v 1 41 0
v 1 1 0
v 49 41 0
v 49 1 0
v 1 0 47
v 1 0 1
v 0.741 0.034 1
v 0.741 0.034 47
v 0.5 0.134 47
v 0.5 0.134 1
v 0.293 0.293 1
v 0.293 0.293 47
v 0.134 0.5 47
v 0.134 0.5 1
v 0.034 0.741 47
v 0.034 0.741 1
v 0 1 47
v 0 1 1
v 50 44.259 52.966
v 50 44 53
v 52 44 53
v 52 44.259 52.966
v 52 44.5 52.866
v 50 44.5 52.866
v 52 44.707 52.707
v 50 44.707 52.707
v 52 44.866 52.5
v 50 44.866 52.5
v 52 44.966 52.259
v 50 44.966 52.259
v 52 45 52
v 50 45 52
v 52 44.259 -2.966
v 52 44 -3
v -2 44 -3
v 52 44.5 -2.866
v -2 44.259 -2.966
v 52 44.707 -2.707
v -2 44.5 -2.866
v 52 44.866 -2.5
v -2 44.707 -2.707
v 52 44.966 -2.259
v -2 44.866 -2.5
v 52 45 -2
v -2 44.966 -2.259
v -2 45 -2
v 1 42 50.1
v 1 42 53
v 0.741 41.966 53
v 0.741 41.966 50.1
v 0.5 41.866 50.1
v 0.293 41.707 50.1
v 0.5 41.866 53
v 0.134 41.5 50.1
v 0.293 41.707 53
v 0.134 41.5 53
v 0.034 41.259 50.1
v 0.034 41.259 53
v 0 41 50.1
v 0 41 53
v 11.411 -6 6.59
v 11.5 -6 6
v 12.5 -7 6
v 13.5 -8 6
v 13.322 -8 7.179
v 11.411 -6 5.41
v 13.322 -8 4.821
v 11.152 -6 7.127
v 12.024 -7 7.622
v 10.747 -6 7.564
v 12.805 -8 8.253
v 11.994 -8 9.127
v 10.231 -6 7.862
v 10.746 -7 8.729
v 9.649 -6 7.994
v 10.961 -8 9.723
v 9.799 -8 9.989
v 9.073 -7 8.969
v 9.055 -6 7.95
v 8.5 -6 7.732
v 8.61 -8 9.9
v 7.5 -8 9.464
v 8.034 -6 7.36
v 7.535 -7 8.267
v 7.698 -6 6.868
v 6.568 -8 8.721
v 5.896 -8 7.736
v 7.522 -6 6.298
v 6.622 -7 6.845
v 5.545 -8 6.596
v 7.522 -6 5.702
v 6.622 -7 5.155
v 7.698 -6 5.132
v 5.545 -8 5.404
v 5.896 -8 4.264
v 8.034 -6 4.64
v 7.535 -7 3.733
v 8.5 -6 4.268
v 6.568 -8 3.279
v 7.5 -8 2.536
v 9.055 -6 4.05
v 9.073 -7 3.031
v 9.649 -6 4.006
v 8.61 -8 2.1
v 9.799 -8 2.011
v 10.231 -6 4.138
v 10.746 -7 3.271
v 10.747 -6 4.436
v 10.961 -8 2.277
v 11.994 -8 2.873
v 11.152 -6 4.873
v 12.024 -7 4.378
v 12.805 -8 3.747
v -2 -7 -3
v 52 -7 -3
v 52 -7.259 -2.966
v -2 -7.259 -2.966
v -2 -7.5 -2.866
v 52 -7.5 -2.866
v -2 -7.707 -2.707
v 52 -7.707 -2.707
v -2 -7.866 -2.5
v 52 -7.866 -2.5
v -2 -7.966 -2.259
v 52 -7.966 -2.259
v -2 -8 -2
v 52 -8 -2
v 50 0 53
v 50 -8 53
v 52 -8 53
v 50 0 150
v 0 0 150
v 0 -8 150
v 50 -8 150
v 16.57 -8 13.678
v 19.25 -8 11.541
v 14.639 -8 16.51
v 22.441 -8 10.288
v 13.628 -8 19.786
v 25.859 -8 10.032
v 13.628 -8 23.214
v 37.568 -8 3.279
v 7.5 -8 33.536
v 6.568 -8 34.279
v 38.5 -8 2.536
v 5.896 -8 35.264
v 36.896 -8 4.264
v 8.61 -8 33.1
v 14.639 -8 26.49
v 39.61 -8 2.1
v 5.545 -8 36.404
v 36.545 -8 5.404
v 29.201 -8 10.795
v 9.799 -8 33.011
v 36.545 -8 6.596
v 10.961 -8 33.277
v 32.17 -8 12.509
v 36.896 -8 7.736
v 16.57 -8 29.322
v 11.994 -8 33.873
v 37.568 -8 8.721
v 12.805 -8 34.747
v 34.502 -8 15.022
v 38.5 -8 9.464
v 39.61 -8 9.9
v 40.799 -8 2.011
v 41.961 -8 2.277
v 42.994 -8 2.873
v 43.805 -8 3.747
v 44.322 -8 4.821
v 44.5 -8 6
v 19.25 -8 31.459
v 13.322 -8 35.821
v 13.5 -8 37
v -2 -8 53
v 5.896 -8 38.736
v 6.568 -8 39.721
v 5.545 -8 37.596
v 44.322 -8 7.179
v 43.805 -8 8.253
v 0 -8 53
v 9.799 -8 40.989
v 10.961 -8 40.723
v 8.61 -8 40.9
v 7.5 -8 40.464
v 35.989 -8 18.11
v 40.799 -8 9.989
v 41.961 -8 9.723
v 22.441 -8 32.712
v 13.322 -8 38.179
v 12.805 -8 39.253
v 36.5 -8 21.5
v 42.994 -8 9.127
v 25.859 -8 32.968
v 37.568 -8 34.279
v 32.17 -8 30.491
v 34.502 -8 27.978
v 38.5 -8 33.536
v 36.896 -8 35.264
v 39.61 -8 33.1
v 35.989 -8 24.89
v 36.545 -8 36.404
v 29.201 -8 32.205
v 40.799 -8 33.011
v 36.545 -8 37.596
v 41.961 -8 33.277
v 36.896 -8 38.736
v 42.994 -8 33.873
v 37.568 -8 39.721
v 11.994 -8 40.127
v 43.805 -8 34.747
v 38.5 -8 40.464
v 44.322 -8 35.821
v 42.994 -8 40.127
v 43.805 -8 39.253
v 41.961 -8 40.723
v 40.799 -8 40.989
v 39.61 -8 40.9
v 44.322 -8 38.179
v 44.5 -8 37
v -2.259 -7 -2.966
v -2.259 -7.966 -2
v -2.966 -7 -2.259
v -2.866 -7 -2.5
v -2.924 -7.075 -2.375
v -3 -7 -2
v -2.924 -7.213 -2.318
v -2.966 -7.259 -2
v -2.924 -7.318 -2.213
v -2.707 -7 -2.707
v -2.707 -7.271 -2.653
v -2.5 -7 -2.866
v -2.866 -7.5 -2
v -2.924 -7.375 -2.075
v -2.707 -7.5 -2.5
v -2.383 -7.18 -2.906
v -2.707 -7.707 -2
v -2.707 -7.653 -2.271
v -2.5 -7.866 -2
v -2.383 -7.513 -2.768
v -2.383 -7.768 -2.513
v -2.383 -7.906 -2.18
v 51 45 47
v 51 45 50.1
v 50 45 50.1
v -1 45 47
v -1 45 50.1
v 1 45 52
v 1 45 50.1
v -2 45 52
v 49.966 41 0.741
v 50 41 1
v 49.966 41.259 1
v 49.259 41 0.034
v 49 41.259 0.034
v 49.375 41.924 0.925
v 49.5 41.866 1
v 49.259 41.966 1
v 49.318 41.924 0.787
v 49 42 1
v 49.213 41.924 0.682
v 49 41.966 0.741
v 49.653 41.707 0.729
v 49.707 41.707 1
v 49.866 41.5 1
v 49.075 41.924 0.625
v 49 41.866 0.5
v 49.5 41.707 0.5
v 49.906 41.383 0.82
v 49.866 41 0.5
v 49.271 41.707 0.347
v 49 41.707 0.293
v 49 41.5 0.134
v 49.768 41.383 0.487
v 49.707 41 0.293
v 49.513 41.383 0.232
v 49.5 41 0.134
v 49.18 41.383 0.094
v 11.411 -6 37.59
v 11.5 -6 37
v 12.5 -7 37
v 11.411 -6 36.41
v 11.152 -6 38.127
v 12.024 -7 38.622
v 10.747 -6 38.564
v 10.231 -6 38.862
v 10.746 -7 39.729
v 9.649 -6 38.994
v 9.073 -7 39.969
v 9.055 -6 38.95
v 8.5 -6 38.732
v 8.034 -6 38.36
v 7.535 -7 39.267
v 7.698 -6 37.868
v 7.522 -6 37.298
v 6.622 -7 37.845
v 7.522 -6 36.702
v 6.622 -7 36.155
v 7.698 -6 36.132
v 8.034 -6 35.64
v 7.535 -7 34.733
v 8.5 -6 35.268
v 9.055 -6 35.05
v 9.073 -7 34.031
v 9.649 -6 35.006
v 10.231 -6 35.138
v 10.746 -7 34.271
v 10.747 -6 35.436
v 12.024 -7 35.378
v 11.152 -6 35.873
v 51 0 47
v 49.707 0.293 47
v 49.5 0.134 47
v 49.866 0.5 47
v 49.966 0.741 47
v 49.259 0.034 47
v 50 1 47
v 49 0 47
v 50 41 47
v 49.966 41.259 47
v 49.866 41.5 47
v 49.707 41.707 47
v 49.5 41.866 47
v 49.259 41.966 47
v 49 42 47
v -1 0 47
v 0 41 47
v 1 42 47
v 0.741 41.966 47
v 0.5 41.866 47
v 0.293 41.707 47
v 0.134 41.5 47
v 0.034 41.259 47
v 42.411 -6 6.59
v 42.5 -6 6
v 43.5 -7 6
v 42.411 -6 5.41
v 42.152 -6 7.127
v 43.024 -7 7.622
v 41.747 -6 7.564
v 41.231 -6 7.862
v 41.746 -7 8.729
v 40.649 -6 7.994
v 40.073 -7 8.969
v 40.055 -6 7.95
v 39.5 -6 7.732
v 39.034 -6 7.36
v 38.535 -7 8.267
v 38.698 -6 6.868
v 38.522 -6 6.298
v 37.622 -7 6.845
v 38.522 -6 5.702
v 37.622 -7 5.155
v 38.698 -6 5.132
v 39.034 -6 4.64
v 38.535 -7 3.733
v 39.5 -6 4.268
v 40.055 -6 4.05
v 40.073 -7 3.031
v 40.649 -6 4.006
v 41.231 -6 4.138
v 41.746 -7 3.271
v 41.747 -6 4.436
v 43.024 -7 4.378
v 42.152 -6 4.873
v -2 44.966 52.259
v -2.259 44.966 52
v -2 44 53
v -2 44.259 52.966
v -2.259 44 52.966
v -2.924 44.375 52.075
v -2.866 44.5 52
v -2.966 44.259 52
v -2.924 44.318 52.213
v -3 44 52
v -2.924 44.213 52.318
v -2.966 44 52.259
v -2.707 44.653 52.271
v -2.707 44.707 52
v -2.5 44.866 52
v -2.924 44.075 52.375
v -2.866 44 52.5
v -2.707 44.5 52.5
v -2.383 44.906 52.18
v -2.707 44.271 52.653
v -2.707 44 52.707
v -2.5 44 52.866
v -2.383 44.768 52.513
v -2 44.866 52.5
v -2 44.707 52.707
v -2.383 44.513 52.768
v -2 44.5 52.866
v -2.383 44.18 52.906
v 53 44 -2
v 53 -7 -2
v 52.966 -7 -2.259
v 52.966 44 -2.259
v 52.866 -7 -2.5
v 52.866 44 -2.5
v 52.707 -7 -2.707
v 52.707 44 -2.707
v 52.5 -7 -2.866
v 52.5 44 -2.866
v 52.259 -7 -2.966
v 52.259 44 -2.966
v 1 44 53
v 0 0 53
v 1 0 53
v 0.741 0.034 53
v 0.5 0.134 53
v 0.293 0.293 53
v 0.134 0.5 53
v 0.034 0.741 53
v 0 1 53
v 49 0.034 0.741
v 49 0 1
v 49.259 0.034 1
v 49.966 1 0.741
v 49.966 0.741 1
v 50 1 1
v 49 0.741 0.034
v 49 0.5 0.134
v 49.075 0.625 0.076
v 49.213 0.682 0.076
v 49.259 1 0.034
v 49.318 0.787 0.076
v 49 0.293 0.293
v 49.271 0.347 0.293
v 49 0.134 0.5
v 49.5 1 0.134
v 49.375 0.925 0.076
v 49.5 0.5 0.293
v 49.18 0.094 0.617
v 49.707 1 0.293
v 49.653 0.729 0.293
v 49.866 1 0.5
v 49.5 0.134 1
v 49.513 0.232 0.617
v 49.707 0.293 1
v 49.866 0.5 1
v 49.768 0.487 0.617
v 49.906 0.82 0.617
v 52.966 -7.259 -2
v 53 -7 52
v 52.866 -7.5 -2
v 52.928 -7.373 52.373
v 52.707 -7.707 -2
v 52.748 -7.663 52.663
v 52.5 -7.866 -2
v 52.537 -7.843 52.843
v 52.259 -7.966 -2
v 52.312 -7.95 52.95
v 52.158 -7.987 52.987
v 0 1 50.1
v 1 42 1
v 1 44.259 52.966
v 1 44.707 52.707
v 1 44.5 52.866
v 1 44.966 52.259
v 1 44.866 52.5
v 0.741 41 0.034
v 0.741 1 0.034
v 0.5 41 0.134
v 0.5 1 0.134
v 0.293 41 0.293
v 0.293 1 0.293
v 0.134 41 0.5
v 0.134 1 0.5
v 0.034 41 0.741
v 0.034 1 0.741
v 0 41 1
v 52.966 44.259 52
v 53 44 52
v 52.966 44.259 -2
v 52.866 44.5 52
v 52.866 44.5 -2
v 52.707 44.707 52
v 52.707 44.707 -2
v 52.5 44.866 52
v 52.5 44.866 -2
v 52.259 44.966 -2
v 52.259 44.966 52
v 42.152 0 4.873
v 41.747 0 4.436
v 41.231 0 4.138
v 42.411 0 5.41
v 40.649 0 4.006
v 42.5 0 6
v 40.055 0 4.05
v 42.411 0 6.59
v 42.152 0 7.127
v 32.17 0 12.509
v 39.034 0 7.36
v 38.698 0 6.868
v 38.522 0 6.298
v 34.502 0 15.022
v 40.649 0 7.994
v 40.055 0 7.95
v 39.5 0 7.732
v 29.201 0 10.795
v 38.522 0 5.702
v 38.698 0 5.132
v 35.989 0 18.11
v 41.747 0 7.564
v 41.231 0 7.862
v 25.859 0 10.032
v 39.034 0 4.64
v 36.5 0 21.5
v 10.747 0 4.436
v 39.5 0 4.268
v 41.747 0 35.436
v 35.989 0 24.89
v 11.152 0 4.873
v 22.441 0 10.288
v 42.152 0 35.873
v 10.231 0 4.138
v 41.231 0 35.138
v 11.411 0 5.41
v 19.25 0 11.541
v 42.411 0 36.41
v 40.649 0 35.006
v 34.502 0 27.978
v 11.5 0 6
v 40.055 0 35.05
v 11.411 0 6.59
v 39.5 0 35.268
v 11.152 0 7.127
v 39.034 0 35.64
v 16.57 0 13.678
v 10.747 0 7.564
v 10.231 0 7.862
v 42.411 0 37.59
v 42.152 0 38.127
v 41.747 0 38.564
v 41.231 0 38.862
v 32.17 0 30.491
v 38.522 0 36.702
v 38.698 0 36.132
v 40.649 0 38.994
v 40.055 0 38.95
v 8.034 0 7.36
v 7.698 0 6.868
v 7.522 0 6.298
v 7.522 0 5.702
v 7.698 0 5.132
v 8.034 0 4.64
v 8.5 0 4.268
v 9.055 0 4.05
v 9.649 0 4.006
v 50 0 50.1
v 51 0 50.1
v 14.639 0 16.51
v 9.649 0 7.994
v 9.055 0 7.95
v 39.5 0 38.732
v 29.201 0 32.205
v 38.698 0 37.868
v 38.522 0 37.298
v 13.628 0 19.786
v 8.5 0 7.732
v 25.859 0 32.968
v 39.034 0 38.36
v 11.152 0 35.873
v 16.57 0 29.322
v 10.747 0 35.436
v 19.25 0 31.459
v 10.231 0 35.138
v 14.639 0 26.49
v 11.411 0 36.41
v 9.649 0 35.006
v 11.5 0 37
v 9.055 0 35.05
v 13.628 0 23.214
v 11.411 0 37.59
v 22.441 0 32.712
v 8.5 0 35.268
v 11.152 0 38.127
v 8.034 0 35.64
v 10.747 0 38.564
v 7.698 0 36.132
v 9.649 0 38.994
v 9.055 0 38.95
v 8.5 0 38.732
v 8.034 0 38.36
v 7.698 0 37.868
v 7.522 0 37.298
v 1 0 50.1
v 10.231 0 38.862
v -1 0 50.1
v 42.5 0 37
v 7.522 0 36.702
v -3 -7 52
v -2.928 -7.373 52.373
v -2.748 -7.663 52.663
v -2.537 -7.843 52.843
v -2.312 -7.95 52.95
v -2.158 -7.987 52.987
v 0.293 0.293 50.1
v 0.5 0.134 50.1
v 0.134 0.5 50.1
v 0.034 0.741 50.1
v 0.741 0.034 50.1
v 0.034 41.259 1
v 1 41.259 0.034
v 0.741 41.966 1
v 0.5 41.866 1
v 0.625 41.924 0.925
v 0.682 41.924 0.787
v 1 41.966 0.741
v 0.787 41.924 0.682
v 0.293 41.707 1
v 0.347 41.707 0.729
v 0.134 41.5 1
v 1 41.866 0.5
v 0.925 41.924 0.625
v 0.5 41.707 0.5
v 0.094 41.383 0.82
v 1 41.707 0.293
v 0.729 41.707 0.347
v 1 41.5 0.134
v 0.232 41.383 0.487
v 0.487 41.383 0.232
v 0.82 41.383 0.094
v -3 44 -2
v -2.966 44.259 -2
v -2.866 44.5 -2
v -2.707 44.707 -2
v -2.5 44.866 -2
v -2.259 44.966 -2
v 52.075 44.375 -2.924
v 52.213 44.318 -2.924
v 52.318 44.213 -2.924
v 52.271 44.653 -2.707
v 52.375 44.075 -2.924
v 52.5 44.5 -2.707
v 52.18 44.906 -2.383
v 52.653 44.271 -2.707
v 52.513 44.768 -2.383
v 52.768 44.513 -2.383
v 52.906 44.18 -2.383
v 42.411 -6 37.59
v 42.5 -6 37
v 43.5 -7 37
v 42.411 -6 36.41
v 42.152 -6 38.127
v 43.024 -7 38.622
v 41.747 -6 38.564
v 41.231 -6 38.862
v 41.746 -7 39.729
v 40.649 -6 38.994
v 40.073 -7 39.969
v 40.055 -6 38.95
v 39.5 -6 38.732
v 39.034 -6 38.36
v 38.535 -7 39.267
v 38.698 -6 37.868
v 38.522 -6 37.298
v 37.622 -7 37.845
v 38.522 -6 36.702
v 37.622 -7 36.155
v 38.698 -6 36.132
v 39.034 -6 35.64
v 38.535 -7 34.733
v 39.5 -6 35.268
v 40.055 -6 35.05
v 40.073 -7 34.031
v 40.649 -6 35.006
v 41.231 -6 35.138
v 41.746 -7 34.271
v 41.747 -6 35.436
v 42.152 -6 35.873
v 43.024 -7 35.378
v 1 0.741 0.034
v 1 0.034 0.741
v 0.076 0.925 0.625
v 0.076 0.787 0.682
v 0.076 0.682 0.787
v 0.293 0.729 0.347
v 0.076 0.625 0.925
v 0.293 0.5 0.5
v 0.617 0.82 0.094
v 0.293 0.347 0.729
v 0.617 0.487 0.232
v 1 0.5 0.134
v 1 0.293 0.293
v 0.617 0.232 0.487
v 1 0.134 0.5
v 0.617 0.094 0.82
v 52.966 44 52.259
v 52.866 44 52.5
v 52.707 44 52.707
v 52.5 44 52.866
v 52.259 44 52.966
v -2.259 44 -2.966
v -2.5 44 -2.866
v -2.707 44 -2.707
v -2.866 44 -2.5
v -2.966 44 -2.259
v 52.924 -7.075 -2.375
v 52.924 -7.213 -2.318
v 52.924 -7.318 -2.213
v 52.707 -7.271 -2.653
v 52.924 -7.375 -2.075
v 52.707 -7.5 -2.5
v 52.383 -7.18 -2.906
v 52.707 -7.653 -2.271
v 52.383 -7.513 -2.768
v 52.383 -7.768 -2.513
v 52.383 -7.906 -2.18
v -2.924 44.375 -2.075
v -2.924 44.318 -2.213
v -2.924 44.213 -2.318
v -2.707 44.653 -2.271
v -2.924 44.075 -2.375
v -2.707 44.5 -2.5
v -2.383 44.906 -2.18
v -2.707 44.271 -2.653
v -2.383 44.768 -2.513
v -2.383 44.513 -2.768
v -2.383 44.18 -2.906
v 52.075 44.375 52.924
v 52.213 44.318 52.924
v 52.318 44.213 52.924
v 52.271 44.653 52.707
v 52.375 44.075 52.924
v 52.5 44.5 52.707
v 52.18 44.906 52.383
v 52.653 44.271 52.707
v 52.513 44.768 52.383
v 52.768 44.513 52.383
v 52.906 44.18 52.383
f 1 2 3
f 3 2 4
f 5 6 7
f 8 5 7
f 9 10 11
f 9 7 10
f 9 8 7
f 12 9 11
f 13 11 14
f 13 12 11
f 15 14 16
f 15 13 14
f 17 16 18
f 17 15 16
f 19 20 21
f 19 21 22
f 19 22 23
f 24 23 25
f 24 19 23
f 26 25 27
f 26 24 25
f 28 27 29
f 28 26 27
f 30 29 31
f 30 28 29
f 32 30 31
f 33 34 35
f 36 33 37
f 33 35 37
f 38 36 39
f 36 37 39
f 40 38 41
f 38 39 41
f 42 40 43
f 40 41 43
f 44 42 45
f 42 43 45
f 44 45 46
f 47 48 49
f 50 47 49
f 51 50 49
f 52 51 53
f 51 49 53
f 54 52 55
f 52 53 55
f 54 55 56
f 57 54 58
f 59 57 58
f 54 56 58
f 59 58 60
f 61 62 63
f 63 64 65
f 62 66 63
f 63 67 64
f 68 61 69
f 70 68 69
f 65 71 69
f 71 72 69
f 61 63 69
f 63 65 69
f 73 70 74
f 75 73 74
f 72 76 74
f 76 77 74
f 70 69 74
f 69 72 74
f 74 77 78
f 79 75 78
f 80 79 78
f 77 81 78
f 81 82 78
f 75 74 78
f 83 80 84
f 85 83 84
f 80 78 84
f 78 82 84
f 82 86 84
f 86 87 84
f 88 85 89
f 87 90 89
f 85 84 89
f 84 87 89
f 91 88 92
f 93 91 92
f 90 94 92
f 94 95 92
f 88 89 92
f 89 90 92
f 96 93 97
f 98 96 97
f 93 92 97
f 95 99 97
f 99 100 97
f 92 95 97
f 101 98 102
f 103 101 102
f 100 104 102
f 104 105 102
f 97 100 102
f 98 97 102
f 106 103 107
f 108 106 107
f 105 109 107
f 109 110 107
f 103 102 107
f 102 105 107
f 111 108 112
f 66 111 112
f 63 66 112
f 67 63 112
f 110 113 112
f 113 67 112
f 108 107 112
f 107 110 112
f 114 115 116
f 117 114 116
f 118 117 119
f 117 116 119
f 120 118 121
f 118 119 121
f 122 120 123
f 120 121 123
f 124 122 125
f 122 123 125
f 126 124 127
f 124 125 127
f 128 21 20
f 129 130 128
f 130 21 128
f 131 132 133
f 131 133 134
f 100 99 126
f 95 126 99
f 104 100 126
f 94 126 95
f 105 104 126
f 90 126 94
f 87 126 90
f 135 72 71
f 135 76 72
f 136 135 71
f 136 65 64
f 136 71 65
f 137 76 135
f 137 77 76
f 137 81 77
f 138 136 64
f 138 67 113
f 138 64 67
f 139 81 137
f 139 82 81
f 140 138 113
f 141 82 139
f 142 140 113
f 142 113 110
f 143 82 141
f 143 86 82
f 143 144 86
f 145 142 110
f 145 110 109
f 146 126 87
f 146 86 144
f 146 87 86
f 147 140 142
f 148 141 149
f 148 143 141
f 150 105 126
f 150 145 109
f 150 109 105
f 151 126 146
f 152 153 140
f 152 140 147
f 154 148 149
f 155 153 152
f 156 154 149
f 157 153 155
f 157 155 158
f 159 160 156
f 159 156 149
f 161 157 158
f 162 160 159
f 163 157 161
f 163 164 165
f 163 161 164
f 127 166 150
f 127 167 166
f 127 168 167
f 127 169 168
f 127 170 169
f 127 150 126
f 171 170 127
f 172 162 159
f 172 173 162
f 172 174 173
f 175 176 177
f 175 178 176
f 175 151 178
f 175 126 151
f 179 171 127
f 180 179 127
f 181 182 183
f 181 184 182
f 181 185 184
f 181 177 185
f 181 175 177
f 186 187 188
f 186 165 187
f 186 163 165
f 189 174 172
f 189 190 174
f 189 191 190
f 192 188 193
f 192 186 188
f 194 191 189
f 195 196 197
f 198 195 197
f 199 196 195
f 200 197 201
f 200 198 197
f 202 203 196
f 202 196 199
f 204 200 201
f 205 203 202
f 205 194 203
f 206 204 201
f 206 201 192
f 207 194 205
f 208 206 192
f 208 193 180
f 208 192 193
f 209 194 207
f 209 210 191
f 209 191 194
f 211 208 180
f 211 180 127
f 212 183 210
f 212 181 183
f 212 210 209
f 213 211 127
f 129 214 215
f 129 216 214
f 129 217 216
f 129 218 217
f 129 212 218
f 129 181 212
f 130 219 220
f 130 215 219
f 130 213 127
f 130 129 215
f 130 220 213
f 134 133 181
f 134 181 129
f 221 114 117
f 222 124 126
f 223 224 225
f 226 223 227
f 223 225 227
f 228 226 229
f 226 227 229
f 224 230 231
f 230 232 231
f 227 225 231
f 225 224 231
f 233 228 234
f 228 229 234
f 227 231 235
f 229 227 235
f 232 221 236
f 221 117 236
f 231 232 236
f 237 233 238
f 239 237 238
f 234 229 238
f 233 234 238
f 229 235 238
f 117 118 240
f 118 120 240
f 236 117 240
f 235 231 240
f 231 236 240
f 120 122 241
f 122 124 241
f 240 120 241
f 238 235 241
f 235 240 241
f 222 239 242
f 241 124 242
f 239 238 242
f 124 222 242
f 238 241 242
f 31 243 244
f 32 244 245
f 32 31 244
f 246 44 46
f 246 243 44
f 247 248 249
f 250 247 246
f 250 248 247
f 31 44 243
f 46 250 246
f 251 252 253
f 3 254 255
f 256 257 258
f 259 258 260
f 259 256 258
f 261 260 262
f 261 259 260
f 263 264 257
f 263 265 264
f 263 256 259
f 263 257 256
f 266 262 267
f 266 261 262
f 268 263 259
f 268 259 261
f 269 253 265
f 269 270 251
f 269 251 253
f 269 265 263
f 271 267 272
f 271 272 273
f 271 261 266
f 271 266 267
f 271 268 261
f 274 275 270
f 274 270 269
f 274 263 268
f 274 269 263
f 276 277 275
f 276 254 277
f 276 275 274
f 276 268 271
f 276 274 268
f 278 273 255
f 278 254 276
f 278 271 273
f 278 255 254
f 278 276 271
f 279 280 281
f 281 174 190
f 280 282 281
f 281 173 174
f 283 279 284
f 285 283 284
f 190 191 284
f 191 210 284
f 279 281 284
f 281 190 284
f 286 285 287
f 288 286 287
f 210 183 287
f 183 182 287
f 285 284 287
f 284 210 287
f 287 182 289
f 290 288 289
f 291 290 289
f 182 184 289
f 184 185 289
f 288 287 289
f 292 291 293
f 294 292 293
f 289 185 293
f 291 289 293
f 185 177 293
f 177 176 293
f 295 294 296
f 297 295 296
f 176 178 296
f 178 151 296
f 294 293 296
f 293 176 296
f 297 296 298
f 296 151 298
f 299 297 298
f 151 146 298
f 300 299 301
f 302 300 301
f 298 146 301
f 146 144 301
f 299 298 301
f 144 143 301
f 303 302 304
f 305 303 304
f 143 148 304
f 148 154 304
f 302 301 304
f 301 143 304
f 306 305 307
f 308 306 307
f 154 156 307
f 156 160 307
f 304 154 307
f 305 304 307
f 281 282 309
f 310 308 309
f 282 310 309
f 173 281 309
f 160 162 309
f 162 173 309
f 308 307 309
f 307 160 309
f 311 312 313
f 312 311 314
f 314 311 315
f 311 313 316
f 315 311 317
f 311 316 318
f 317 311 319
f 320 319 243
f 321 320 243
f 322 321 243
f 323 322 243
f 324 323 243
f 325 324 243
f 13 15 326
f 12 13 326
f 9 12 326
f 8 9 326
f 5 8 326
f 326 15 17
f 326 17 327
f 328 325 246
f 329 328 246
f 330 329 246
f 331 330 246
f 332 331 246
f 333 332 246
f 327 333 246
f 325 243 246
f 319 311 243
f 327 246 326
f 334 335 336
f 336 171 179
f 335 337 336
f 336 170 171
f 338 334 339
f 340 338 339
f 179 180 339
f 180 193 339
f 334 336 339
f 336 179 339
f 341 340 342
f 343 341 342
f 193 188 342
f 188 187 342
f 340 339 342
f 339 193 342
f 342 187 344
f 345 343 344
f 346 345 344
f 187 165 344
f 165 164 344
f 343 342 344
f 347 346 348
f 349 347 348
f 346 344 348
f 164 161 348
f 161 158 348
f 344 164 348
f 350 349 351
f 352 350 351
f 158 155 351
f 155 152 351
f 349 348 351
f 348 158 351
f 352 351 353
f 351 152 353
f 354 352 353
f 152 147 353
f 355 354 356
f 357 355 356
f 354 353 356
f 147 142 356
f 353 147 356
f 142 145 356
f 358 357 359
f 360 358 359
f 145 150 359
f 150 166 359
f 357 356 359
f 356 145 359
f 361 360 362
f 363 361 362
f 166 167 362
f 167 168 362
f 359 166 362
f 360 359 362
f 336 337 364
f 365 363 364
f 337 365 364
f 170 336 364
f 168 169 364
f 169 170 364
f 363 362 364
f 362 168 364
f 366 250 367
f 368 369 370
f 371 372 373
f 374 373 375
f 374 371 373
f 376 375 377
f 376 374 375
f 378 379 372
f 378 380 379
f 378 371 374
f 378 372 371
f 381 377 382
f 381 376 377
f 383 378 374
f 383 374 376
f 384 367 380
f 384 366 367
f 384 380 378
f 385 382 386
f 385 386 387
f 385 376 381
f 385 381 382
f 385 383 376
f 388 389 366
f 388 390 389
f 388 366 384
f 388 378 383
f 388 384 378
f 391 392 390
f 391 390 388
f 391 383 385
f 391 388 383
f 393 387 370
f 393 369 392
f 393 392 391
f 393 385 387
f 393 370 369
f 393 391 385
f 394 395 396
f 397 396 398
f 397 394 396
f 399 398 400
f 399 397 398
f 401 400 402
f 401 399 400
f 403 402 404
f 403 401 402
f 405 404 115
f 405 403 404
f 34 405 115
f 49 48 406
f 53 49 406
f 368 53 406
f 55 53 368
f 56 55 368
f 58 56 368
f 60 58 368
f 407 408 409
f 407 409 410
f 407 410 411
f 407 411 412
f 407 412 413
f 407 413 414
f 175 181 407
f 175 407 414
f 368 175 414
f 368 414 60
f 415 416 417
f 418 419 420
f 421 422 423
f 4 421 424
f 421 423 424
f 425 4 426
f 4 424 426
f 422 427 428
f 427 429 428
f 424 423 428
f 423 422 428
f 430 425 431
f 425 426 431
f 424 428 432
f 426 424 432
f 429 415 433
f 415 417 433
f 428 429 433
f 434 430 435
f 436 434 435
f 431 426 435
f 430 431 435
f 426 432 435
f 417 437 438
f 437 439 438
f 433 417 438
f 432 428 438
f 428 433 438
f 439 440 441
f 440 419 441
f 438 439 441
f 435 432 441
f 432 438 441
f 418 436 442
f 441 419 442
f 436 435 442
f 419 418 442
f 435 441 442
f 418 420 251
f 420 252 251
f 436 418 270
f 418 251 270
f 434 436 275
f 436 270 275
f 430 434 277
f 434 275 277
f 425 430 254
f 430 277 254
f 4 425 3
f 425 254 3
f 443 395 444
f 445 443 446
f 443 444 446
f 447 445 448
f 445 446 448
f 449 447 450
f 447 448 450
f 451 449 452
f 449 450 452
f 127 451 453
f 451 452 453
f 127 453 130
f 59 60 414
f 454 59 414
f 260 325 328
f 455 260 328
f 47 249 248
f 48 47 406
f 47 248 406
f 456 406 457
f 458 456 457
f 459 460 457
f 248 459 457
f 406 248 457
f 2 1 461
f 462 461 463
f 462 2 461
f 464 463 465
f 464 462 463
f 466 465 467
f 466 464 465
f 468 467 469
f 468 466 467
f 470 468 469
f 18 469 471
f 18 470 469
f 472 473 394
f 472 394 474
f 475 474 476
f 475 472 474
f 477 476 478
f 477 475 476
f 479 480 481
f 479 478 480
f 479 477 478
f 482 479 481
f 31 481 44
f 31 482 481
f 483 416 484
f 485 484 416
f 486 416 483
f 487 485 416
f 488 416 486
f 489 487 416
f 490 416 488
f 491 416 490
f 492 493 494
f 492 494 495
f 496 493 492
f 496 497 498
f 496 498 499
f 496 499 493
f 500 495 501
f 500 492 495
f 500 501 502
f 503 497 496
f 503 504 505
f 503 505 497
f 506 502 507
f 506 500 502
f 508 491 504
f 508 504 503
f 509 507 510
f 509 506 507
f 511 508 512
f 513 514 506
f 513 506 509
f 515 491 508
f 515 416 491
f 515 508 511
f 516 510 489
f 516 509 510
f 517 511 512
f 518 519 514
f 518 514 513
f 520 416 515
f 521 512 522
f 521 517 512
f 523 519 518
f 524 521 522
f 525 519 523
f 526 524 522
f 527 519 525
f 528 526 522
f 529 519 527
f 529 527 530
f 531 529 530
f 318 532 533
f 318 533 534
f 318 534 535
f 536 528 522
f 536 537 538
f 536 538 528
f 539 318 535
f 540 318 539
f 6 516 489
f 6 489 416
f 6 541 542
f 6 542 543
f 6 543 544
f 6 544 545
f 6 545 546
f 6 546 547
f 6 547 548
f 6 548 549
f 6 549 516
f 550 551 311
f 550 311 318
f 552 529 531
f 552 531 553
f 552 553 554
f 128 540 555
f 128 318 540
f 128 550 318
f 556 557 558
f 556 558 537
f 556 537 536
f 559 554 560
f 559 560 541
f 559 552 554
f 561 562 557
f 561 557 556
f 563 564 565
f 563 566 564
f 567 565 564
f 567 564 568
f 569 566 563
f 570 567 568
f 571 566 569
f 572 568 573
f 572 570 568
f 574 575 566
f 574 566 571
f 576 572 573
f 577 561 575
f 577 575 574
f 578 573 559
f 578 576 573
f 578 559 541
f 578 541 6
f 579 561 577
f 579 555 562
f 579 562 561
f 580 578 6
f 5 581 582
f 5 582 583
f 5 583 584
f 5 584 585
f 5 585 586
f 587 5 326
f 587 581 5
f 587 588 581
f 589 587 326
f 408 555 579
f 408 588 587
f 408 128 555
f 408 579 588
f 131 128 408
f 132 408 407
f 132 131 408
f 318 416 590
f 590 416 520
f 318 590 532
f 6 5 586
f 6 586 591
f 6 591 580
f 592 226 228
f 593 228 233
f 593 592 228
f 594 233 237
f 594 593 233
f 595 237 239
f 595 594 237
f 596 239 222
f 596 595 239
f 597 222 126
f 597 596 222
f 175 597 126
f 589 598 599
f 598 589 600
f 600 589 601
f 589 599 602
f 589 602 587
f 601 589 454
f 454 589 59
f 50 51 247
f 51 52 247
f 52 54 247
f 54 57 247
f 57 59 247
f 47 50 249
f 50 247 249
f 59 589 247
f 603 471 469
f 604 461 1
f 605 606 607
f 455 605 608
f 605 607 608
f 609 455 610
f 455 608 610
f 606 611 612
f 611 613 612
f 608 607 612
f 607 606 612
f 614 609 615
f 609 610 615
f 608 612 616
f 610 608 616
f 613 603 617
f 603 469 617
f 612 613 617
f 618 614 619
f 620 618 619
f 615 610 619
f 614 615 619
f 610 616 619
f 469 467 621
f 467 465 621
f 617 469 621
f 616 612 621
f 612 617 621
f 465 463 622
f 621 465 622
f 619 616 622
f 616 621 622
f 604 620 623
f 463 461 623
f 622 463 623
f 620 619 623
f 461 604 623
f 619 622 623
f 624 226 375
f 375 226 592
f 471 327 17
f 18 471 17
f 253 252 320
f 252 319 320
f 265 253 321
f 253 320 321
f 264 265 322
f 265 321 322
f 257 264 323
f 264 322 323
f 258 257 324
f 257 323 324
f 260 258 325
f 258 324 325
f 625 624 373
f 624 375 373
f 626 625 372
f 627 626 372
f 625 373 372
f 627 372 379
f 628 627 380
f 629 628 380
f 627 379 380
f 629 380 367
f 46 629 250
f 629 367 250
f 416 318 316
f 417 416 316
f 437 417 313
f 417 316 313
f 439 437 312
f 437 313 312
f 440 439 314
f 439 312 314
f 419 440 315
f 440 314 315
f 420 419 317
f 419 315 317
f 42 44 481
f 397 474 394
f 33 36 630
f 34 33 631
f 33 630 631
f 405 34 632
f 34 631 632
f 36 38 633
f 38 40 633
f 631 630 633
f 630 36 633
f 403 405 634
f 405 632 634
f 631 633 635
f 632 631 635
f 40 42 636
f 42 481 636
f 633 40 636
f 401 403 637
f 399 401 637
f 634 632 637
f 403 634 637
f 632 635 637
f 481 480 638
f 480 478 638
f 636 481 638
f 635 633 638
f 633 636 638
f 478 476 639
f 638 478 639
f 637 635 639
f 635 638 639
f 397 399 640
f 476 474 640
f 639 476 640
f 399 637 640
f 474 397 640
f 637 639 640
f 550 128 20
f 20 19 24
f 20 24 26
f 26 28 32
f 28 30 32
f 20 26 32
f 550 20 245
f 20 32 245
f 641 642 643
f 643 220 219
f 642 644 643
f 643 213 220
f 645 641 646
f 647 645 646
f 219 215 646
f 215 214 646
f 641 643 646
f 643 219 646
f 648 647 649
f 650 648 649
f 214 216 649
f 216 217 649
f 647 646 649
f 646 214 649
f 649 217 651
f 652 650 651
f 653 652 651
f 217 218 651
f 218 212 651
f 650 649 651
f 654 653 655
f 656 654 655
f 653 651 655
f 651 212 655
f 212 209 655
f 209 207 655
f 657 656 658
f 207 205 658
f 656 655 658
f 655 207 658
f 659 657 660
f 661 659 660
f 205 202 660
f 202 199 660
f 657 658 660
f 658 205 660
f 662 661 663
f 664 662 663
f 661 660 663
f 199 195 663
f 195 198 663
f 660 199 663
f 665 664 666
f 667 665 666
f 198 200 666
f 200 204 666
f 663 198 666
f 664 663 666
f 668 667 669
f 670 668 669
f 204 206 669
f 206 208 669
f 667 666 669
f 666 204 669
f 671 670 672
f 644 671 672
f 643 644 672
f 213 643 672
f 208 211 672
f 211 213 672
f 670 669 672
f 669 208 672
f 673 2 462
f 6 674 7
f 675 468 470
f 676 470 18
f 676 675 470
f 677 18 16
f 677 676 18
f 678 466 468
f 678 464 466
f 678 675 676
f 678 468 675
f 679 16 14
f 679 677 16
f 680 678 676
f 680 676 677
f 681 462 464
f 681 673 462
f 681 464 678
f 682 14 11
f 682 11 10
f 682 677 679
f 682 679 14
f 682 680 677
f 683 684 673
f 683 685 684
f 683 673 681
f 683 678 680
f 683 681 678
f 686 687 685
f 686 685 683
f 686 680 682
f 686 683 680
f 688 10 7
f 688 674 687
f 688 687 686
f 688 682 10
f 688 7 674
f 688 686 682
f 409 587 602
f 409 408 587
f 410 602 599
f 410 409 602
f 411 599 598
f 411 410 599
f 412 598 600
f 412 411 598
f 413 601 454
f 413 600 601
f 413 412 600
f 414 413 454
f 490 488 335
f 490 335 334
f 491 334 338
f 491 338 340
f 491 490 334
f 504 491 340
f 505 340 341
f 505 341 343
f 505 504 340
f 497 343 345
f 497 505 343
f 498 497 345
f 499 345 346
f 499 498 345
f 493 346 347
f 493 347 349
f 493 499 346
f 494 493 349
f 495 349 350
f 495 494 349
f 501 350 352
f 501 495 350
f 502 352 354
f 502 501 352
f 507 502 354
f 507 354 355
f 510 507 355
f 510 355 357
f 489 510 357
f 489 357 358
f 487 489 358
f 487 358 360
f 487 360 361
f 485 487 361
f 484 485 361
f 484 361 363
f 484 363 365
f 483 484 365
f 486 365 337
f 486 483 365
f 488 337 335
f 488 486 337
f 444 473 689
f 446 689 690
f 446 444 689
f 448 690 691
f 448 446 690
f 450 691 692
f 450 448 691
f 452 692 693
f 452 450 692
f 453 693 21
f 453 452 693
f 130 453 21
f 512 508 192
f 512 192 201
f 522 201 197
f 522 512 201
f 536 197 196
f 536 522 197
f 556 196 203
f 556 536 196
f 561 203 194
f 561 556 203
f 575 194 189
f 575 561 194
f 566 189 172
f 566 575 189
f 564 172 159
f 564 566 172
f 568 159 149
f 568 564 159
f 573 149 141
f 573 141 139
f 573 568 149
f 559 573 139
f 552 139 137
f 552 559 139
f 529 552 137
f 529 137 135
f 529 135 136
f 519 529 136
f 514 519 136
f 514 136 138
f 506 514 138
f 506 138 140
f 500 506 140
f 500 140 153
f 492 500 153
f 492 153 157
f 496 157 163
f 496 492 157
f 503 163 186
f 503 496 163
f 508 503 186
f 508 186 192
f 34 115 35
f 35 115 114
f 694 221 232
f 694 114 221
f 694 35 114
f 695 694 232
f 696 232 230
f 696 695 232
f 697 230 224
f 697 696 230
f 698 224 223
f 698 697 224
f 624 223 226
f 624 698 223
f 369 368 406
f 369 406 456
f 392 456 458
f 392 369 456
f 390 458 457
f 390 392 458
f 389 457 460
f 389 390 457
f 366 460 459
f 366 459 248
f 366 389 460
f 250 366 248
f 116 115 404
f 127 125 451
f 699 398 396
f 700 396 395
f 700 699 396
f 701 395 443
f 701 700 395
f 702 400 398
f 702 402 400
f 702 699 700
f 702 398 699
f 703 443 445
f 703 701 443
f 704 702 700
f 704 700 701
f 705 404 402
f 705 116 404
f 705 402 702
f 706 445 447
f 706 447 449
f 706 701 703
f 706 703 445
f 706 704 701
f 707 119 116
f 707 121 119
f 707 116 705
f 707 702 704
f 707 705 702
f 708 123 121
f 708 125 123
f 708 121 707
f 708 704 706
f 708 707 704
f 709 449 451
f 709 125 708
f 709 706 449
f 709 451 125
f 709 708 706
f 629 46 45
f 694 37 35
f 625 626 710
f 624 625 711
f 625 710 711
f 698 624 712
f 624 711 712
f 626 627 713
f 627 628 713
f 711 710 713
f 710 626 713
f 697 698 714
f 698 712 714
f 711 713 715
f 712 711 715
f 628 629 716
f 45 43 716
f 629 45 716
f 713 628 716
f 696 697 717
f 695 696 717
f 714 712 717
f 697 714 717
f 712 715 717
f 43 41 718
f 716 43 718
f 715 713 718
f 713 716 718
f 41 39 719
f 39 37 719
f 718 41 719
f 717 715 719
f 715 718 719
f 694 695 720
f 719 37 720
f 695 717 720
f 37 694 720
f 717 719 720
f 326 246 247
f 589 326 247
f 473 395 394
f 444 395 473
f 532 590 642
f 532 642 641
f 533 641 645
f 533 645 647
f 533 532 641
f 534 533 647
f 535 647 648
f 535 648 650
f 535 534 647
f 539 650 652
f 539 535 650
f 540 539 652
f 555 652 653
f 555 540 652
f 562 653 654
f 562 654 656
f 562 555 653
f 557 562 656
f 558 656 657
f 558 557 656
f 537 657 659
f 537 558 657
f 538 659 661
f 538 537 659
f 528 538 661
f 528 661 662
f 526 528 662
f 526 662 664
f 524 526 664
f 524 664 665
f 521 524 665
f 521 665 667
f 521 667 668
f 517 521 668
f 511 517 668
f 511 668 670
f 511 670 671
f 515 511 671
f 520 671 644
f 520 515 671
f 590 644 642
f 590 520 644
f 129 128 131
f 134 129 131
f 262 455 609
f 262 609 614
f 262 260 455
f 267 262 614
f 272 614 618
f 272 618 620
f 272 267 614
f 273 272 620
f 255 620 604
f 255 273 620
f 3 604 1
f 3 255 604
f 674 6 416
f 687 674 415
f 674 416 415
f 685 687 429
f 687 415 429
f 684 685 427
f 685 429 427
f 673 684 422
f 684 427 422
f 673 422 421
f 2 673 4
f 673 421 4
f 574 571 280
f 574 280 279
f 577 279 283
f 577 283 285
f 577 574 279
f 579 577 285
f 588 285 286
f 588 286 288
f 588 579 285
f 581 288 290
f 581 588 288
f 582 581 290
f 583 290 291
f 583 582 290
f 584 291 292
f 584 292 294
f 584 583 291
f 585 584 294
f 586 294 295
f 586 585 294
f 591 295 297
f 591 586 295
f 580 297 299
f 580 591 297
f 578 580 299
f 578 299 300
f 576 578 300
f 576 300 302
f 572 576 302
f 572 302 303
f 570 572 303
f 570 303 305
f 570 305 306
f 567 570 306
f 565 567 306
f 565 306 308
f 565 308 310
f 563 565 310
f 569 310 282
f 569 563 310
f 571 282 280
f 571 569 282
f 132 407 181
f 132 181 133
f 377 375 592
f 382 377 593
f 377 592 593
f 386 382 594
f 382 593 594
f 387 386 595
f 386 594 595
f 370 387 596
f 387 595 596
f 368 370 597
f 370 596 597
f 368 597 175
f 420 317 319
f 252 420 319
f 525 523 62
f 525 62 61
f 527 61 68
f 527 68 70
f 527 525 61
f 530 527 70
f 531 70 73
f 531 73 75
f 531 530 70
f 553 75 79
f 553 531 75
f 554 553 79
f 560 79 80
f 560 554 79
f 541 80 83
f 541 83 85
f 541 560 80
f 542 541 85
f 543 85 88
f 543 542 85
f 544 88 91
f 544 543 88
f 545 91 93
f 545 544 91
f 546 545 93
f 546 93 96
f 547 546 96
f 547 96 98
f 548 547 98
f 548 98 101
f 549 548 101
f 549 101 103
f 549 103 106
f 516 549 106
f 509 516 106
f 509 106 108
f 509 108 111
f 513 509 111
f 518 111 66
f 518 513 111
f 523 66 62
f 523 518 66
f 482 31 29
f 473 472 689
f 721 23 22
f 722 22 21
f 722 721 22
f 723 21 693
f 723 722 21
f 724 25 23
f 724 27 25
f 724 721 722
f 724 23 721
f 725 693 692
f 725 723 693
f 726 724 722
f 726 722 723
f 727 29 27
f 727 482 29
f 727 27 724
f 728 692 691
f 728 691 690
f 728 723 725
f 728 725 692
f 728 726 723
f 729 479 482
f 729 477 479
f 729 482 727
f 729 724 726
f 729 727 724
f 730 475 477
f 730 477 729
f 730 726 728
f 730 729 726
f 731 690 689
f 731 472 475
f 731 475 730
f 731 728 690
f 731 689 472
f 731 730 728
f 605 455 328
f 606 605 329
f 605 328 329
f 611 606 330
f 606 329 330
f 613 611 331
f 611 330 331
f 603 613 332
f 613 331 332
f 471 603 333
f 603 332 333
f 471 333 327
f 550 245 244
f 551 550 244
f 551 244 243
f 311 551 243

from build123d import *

# Parameters (mm, degrees)
F0_W      = 50
F0_H      = 150
F0_R      = 2
F0_R_2    = 11.5
F1_DEPTH  = 8
F2_SIZE   = 2
F3_W      = 50
F3_H      = 53
F4_DEPTH  = 3
F5_W      = 50
F5_H      = 53
F6_DEPTH  = 3
F7_W      = 56
F7_H      = 50
F8_DEPTH  = 3
F9_W      = 56
F9_H      = 56
F10_DEPTH = 3
F11_R     = 1
F13_DEPTH = 45


with BuildPart() as f1:
    # F0 (on Front) → F1 (new body)
    with BuildSketch(Plane.XZ):
        with Locations((25, 75)):
            Rectangle(F0_W, F0_H)
        with Locations((9.5, 6)):
            Circle(F0_R, mode=Mode.SUBTRACT)
        with Locations((9.5, 37)):
            Circle(F0_R, mode=Mode.SUBTRACT)
        with Locations((25, 21.5)):
            Circle(F0_R_2, mode=Mode.SUBTRACT)
        with Locations((40.5, 6)):
            Circle(F0_R, mode=Mode.SUBTRACT)
        with Locations((40.5, 37)):
            Circle(F0_R, mode=Mode.SUBTRACT)
    extrude(amount=F1_DEPTH)

    # F2
    f2_edges = [f1.edges().sort_by_distance(p)[0] for p in [
        (7.5, -8, 37),
        (38.5, -8, 37),
        (38.5, -8, 6),
        (7.5, -8, 6),
    ]]
    chamfer(f2_edges, length=F2_SIZE)

    # F3 (on face) → F4 (join)
    with BuildSketch(Plane.YZ.offset(50)):
        with Locations((17, 26.5)):
            Rectangle(F3_W, F3_H)
    extrude(amount=F4_DEPTH)

    # F5 (on face) → F6 (join)
    with BuildSketch(Plane(origin=(0, 0, 0), x_dir=(0, -1, 0), z_dir=(-1, 0, 0))):
        with Locations((-17, 26.5)):
            Rectangle(F5_W, F5_H)
    extrude(amount=F6_DEPTH)

    # F7 (on face) → F8 (join)
    with BuildSketch(Plane(origin=(0, 0, 0), x_dir=(1, 0, 0), z_dir=(0, 0, -1))):
        with Locations((25, -17)):
            Rectangle(F7_W, F7_H)
    extrude(amount=F8_DEPTH)

    # F9 (on face) → F10 (join)
    with BuildSketch(Plane(origin=(0, 42, 0), x_dir=(-1, 0, 0), z_dir=(0, 1, 0))):
        with Locations((-25, 25)):
            Rectangle(F9_W, F9_H)
    extrude(amount=F10_DEPTH)

    # F11
    f11_edges = [f1.edges().sort_by_distance(p)[0] for p in [
        (50, 0, 26.5),
        (25, 0, 0),
        (50, 21, 0),
        (0, 21, 0),
        (0, 42, 26.5),
        (50, 42, 26.5),
        (0, 0, 26.5),
        (25, 42, 0),
        (53, 45, 25),
        (25, 45, 53),
        (25, 45, -3),
        (-3, 45, 25),
        (25, -8, -3),
        (-3, 18.5, -3),
        (53, 18.5, -3),
        (53, -8, 25),
        (53, 18.5, 53),
        (-3, -8, 25),
        (-3, 18.5, 53),
    ]]
    fillet(f11_edges, radius=F11_R)

    # F12 (on face) → F13 (cut, through all)
    with BuildSketch(Plane(origin=(0, 45, 0), x_dir=(-1, 0, 0), z_dir=(0, 1, 0))):
        Polygon((-50, 50.1), (-51, 50.1), (-51, 47), (1, 47), (1, 50.1), (-1, 50.1), (-1, 53), (-50, 53), align=None)
    extrude(amount=-F13_DEPTH, mode=Mode.SUBTRACT)


solid = f1.part
